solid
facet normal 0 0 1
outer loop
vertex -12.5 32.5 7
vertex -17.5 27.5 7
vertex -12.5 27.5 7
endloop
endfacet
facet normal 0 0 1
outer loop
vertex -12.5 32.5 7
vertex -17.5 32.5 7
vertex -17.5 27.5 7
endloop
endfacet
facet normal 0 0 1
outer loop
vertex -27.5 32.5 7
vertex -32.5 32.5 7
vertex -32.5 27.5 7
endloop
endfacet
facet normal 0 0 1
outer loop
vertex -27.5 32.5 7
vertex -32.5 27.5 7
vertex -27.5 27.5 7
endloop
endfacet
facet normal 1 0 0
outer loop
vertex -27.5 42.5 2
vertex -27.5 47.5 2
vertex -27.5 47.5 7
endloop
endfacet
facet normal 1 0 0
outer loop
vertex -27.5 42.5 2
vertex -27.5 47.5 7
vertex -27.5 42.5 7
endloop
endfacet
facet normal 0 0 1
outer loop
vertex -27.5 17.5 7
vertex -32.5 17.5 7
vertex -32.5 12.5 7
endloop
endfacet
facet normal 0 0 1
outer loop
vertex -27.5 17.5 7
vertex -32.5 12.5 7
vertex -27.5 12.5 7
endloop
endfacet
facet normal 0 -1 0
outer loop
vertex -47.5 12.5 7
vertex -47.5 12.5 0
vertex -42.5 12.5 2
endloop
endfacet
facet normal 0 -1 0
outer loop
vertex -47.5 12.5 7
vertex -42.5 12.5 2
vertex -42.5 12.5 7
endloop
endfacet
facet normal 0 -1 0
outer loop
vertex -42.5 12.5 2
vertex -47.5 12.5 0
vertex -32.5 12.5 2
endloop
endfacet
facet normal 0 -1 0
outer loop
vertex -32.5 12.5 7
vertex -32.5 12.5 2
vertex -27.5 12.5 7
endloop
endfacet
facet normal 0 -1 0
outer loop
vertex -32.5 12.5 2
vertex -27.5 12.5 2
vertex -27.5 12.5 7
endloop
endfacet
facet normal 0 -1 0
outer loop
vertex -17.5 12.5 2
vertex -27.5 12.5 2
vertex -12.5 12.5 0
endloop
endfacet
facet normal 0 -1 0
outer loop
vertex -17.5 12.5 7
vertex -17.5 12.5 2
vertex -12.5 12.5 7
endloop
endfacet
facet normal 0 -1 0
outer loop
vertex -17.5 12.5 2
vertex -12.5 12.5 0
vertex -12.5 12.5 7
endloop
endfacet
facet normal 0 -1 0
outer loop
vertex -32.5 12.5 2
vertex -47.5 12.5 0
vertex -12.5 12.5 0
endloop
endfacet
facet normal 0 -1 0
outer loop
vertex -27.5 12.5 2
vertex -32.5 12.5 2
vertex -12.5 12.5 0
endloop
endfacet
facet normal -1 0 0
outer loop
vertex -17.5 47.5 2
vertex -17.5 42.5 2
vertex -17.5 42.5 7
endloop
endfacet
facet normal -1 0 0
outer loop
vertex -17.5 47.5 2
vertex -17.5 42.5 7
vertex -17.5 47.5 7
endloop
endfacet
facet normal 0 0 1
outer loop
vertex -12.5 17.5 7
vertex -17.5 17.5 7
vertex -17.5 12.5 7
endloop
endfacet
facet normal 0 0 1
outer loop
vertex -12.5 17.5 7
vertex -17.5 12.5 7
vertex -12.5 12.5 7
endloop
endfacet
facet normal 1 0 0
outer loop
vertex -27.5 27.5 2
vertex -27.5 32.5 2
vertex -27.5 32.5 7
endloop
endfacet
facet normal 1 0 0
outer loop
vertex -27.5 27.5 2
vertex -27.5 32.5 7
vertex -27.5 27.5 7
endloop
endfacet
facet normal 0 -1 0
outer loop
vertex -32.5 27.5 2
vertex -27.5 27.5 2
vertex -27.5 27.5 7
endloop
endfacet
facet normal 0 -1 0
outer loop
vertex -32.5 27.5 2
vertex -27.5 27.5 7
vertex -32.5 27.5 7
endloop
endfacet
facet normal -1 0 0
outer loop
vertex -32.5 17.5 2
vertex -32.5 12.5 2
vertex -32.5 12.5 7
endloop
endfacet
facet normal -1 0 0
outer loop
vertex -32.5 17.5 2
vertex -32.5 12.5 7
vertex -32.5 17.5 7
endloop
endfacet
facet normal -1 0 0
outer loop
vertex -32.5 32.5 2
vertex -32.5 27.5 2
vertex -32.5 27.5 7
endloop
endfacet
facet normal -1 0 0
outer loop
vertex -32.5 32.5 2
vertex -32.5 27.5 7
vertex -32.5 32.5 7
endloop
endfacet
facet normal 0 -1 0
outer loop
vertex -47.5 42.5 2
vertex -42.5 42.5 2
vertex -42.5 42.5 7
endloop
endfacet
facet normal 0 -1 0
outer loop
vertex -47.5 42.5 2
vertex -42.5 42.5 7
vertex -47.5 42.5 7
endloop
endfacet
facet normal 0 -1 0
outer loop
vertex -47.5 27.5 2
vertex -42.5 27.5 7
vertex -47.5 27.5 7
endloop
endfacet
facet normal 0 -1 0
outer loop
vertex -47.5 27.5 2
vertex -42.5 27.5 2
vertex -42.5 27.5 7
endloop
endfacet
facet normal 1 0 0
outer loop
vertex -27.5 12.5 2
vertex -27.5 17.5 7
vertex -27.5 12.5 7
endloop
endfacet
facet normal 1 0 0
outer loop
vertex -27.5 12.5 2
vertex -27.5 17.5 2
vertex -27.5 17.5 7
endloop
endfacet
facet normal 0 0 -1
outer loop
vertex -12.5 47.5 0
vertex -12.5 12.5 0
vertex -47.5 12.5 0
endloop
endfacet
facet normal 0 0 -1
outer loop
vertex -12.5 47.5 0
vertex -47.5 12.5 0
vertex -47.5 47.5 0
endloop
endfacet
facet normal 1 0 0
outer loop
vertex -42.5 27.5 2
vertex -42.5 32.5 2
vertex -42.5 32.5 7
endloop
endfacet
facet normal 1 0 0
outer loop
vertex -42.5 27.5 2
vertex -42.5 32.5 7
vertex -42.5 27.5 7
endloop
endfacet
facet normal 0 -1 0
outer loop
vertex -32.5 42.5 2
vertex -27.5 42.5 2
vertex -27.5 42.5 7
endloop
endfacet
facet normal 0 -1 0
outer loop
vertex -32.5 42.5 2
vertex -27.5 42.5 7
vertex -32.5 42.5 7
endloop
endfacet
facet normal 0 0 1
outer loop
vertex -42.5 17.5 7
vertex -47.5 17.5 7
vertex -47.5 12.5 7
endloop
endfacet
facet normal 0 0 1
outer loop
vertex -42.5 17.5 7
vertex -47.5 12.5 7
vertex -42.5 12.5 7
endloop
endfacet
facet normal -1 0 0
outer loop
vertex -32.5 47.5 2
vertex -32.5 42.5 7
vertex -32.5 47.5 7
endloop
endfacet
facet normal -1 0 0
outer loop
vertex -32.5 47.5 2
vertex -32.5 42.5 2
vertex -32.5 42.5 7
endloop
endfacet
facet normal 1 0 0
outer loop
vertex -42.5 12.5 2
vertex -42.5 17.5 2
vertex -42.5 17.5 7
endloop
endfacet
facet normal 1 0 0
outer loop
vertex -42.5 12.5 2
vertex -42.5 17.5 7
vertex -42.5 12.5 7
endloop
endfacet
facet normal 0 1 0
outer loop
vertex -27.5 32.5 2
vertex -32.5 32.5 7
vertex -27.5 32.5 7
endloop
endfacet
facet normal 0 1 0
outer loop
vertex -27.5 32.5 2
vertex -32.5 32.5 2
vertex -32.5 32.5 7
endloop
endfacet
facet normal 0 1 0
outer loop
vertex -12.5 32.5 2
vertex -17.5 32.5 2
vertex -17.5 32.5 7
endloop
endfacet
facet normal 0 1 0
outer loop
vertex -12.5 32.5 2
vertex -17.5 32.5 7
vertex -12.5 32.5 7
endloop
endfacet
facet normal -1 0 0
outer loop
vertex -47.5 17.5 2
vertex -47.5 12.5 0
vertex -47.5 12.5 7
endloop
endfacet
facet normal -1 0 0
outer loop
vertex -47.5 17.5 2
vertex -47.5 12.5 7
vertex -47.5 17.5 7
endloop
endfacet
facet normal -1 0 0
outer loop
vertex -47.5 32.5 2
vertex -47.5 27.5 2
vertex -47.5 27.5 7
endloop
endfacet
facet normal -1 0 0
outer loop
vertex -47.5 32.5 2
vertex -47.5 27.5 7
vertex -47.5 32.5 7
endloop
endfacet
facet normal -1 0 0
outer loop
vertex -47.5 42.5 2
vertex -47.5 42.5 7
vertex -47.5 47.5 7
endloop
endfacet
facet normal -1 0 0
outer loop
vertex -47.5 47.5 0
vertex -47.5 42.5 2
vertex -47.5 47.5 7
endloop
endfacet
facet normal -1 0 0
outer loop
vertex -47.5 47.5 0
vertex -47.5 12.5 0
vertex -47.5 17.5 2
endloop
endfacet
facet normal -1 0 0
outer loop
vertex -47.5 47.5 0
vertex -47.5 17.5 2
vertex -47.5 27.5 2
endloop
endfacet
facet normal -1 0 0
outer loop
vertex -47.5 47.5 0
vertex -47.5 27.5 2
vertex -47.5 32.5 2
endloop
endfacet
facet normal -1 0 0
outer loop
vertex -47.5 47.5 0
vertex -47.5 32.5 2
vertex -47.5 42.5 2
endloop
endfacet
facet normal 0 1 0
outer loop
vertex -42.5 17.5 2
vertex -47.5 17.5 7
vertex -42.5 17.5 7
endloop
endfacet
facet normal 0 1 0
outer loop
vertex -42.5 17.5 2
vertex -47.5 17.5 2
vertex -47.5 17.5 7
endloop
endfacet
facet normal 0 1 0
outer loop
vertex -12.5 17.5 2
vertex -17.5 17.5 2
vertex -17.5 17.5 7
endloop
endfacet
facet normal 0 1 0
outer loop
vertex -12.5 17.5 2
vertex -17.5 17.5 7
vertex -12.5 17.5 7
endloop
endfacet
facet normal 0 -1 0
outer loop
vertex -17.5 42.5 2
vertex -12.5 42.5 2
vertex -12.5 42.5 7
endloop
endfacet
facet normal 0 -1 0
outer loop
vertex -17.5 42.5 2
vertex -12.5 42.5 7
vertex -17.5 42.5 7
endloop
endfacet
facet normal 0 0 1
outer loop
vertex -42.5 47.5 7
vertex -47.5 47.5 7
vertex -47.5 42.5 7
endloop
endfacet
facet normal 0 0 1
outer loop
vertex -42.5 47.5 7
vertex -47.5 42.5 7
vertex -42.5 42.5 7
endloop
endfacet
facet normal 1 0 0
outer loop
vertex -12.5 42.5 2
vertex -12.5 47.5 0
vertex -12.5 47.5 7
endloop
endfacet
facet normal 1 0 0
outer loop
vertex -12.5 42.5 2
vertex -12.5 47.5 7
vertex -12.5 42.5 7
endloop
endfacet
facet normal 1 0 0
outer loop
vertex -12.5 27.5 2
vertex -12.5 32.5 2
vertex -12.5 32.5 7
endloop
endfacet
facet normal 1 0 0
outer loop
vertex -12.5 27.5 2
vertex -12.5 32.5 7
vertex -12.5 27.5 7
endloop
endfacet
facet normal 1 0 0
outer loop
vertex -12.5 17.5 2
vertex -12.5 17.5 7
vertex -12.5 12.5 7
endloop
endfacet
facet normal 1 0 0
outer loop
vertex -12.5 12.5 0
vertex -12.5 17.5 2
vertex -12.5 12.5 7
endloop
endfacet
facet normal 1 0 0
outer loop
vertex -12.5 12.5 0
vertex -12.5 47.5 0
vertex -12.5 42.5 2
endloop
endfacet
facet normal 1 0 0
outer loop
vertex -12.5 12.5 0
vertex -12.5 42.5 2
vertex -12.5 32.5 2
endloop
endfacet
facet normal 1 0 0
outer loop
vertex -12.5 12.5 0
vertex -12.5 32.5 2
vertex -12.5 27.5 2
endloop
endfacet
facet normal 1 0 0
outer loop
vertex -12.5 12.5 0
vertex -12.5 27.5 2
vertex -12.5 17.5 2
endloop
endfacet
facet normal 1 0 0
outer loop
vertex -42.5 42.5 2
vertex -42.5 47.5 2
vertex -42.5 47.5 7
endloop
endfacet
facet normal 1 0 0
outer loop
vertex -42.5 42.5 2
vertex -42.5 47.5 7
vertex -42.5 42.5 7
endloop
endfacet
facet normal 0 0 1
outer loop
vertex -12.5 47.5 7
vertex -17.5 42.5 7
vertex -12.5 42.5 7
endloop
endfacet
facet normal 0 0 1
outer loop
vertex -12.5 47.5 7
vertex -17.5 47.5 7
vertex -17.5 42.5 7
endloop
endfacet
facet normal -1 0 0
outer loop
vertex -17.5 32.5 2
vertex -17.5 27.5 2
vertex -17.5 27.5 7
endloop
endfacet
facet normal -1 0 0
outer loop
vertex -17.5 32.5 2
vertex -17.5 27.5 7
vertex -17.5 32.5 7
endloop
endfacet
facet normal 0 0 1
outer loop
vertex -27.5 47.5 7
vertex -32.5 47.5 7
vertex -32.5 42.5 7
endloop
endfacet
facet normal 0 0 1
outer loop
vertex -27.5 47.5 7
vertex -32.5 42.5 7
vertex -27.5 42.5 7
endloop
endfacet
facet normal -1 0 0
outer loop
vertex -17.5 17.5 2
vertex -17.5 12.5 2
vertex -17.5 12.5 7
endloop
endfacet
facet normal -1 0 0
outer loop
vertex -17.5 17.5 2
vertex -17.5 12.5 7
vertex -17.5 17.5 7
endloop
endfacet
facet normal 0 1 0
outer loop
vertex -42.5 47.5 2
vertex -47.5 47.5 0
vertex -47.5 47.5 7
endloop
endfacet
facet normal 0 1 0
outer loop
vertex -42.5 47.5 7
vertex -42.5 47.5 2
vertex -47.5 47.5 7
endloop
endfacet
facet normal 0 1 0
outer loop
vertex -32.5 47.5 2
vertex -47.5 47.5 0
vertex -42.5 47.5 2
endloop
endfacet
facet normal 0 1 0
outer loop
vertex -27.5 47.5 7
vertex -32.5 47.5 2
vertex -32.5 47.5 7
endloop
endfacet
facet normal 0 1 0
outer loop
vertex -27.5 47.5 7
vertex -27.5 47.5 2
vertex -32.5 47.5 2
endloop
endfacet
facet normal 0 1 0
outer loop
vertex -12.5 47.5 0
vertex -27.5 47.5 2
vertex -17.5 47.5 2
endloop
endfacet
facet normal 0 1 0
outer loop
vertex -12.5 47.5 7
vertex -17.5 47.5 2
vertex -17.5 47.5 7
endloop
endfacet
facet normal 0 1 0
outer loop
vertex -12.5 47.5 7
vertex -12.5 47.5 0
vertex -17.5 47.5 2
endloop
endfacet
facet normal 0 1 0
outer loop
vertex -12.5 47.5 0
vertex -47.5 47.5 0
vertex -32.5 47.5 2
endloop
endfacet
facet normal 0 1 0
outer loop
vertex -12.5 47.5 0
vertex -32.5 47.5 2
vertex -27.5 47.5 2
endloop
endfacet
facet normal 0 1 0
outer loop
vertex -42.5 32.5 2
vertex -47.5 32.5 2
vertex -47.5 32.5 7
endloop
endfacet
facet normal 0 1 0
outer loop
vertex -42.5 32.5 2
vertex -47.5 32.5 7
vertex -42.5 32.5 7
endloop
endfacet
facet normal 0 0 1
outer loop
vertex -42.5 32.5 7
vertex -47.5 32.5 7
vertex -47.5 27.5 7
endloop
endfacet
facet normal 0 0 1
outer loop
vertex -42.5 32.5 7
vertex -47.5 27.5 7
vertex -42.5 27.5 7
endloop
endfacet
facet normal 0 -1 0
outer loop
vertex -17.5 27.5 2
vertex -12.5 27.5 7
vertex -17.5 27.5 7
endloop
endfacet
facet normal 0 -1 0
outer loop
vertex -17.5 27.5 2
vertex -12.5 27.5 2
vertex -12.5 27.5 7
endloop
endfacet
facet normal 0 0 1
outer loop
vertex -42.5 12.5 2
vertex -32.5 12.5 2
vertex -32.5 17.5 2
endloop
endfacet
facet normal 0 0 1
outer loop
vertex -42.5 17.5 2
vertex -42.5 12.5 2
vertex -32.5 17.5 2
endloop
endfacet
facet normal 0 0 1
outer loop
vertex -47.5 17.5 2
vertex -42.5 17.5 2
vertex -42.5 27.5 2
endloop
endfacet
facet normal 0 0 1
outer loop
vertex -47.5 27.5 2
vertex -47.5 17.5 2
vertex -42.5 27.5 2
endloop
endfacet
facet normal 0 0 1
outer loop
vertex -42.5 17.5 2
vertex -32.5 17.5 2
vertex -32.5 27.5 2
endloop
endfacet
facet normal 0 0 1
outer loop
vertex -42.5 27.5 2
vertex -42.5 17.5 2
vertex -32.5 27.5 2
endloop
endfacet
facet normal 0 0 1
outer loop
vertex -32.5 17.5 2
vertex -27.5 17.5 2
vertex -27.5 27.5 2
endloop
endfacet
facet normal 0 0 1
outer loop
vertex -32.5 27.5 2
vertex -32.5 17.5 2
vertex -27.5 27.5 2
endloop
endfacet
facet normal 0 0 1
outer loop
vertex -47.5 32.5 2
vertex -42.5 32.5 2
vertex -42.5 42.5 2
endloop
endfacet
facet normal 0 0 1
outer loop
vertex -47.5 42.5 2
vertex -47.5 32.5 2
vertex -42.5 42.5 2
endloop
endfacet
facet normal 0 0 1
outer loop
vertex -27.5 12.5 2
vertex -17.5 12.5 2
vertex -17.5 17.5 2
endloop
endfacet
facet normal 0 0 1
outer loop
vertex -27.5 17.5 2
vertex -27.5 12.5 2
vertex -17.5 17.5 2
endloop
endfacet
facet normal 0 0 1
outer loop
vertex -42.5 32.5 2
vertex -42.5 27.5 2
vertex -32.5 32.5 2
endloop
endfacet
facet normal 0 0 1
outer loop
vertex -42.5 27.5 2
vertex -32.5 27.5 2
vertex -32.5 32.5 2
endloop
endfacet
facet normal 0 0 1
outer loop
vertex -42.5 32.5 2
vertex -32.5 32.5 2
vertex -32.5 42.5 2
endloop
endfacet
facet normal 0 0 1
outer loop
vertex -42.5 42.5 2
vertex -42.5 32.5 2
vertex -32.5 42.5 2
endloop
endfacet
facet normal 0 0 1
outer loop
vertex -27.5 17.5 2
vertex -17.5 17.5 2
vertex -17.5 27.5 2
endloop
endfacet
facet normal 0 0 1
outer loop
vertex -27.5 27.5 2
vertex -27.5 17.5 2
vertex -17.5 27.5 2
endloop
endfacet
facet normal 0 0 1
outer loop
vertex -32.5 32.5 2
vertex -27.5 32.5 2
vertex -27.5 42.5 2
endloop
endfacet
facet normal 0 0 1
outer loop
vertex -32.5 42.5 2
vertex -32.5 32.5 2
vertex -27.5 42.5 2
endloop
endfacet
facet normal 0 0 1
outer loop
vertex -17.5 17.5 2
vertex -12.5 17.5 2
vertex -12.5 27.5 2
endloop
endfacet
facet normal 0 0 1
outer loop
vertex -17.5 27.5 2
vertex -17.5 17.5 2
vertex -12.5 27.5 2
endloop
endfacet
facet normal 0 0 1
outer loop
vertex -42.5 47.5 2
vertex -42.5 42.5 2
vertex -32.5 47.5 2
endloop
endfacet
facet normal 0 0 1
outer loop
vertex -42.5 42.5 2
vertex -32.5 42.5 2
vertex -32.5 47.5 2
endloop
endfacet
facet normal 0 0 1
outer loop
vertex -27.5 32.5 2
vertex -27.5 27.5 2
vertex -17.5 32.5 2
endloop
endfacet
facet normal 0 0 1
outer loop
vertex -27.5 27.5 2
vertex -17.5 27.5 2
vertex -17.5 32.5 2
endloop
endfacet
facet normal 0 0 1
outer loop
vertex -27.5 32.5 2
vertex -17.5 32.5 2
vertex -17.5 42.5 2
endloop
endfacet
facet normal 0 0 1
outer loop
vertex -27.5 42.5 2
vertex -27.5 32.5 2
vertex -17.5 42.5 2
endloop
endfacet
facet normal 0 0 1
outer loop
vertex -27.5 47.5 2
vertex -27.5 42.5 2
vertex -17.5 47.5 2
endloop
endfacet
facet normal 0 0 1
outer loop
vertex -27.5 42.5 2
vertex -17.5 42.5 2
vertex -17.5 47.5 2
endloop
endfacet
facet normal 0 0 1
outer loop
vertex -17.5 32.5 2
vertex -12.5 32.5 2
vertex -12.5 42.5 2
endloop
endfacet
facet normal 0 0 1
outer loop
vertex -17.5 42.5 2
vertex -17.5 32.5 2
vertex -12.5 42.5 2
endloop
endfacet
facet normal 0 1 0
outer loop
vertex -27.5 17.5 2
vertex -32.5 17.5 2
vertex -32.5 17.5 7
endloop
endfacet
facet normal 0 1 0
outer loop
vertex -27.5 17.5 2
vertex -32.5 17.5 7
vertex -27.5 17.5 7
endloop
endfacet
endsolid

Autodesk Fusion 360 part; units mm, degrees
sketch "Sketch1" plane through (0, 0, 0) normal (0, 0, 1) x (1, 0, 0)
  line L0 (0, 0) -> (-50, 0)
  line L1 (-50, 0) -> (-50, 50)
  line L2 (-50, 50) -> (0, 50)
  line L3 (0, 50) -> (0, 0)
  line L4 (-45, 45) -> (-47.5, 45)
  line L5 (-47.5, 45) -> (-47.5, 47.5)
  line L6 (-47.5, 47.5) -> (-45, 47.5)
  line L7 (-45, 47.5) -> (-45, 45)
  line L8 (-45, 45) -> (-42.5, 45)
  line L9 (-42.5, 45) -> (-42.5, 42.5)
  line L10 (-42.5, 42.5) -> (-45, 42.5)
  line L11 (-45, 42.5) -> (-45, 45)
  line L12 (-42.5, 42.5) -> (-47.5, 42.5)
  line L13 (-47.5, 42.5) -> (-47.5, 47.5)
  line L14 (-47.5, 47.5) -> (-42.5, 47.5)
  line L15 (-42.5, 47.5) -> (-42.5, 42.5)
  line L16 (-30, 45) -> (-32.5, 45)
  line L17 (-32.5, 45) -> (-32.5, 47.5)
  line L18 (-32.5, 47.5) -> (-30, 47.5)
  line L19 (-30, 47.5) -> (-30, 45)
  line L20 (-32.5, 47.5) -> (-27.5, 47.5)
  line L21 (-27.5, 47.5) -> (-27.5, 42.5)
  line L22 (-27.5, 42.5) -> (-32.5, 42.5)
  line L23 (-32.5, 42.5) -> (-32.5, 47.5)
  line L24 (-15, 45) -> (-17.5, 45)
  line L25 (-17.5, 45) -> (-17.5, 47.5)
  line L26 (-17.5, 47.5) -> (-15, 47.5)
  line L27 (-15, 47.5) -> (-15, 45)
  line L28 (-17.5, 47.5) -> (-12.5, 47.5)
  line L29 (-12.5, 47.5) -> (-12.5, 42.5)
  line L30 (-12.5, 42.5) -> (-17.5, 42.5)
  line L31 (-17.5, 42.5) -> (-17.5, 47.5)
  line L32 (-15, 30) -> (-17.5, 30)
  line L33 (-17.5, 30) -> (-17.5, 32.5)
  line L34 (-17.5, 32.5) -> (-15, 32.5)
  line L35 (-15, 32.5) -> (-15, 30)
  line L36 (-17.5, 32.5) -> (-12.5, 32.5)
  line L37 (-12.5, 32.5) -> (-12.5, 27.5)
  line L38 (-12.5, 27.5) -> (-17.5, 27.5)
  line L39 (-17.5, 27.5) -> (-17.5, 32.5)
  line L40 (-45, 30) -> (-47.5, 30)
  line L41 (-47.5, 30) -> (-47.5, 32.5)
  line L42 (-47.5, 32.5) -> (-45, 32.5)
  line L43 (-45, 32.5) -> (-45, 30)
  line L44 (-47.5, 32.5) -> (-42.5, 32.5)
  line L45 (-42.5, 32.5) -> (-42.5, 27.5)
  line L46 (-42.5, 27.5) -> (-47.5, 27.5)
  line L47 (-47.5, 27.5) -> (-47.5, 32.5)
  line L48 (-30, 30) -> (-32.5, 30)
  line L49 (-32.5, 30) -> (-32.5, 32.5)
  line L50 (-32.5, 32.5) -> (-30, 32.5)
  line L51 (-30, 32.5) -> (-30, 30)
  line L52 (-32.5, 32.5) -> (-27.5, 32.5)
  line L53 (-27.5, 32.5) -> (-27.5, 27.5)
  line L54 (-27.5, 27.5) -> (-32.5, 27.5)
  line L55 (-32.5, 27.5) -> (-32.5, 32.5)
  line L56 (-45, 15) -> (-47.5, 15)
  line L57 (-47.5, 15) -> (-47.5, 17.5)
  line L58 (-47.5, 17.5) -> (-45, 17.5)
  line L59 (-45, 17.5) -> (-45, 15)
  line L60 (-47.5, 17.5) -> (-42.5, 17.5)
  line L61 (-42.5, 17.5) -> (-42.5, 12.5)
  line L62 (-42.5, 12.5) -> (-47.5, 12.5)
  line L63 (-47.5, 12.5) -> (-47.5, 17.5)
  line L64 (-30, 15) -> (-32.5, 15)
  line L65 (-32.5, 15) -> (-32.5, 17.5)
  line L66 (-32.5, 17.5) -> (-30, 17.5)
  line L67 (-30, 17.5) -> (-30, 15)
  line L68 (-32.5, 17.5) -> (-27.5, 17.5)
  line L69 (-27.5, 17.5) -> (-27.5, 12.5)
  line L70 (-27.5, 12.5) -> (-32.5, 12.5)
  line L71 (-32.5, 12.5) -> (-32.5, 17.5)
  line L72 (-15, 15) -> (-17.5, 15)
  line L73 (-17.5, 15) -> (-17.5, 17.5)
  line L74 (-17.5, 17.5) -> (-15, 17.5)
  line L75 (-15, 17.5) -> (-15, 15)
  line L76 (-17.5, 17.5) -> (-12.5, 17.5)
  line L77 (-12.5, 17.5) -> (-12.5, 12.5)
  line L78 (-12.5, 12.5) -> (-17.5, 12.5)
  line L79 (-17.5, 12.5) -> (-17.5, 17.5)
  point P0 (-45, 45)
  point P1 (-30, 45)
  point P2 (-15, 45)
  point P3 (-45, 30)
  point P4 (-30, 30)
  point P5 (-15, 30)
  point P6 (-15, 15)
  point P7 (-30, 15)
  point P8 (-45, 15)
  dimension "d1" = 2.5
  dimension "d2" = 2.5
  dimension "d3" = 2.5
  dimension "d4" = 5
  dimension "d5" = 5
  dimension "d6" = 2.5
  dimension "d7" = 2.5
  dimension "d8" = 5
  dimension "d9" = 5
  dimension "d10" = 2.5
  dimension "d11" = 2.5
  dimension "d12" = 5
  dimension "d13" = 5
  dimension "d14" = 2.5
  dimension "d15" = 2.5
  dimension "d16" = 5
  dimension "d17" = 5
  dimension "d18" = 2.5
  dimension "d19" = 2.5
  dimension "d20" = 5
  dimension "d21" = 5
extrude "Extrude1" add sketch "Sketch1" along normal blind 2
extrude "Extrude2" add sketch "Sketch1" along normal blind 7 contours L4 L11 L12 L13 | L4 L5 L6 L7 L13 L14 | L7 L8 L14 L15 | L8 L9 L10 L11 L12 L15 | L16 L19 L20 L21 L22 L23 | L16 L17 L18 L19 L20 L23 | L24 L27 L28 L29 L30 L31 | L24 L25 L26 L27 L28 L31 | L32 L35 L36 L37 L38 L39 | L32 L33 L34 L35 L36 L39 | L40 L43 L44 L45 L46 L47 | L40 L41 L42 L43 L44 L47 | L48 L51 L52 L53 L54 L55 | L48 L49 L50 L51 L52 L55 | L56 L59 L60 L61 L62 L63 | L56 L57 L58 L59 L60 L63 | L64 L67 L68 L69 L70 L71 | L64 L65 L66 L67 L68 L71 | L72 L75 L76 L77 L78 L79 | L72 L73 L74 L75 L76 L79
extrude "Extrude3" add 1 faces at (-50, 16.6667, 0.6667) along direction (-1, 0, 0) blind 5
extrude "Extrude4" cut 1 faces at (-18.3333, 0, 0.6667) along direction (0, 1, 0) blind 12.5
extrude "Extrude5" cut 1 faces at (-55, 25, 1.3333) along direction (1, 0, 0) blind 7.5
extrude "Extrude6" cut 1 faces at (-15.8333, 50, 0.6667) along direction (0, -1, 0) blind 2.5
extrude "Extrude7" cut 1 faces at (0, 35.8333, 0.6667) along direction (-1, 0, 0) blind 12.5
